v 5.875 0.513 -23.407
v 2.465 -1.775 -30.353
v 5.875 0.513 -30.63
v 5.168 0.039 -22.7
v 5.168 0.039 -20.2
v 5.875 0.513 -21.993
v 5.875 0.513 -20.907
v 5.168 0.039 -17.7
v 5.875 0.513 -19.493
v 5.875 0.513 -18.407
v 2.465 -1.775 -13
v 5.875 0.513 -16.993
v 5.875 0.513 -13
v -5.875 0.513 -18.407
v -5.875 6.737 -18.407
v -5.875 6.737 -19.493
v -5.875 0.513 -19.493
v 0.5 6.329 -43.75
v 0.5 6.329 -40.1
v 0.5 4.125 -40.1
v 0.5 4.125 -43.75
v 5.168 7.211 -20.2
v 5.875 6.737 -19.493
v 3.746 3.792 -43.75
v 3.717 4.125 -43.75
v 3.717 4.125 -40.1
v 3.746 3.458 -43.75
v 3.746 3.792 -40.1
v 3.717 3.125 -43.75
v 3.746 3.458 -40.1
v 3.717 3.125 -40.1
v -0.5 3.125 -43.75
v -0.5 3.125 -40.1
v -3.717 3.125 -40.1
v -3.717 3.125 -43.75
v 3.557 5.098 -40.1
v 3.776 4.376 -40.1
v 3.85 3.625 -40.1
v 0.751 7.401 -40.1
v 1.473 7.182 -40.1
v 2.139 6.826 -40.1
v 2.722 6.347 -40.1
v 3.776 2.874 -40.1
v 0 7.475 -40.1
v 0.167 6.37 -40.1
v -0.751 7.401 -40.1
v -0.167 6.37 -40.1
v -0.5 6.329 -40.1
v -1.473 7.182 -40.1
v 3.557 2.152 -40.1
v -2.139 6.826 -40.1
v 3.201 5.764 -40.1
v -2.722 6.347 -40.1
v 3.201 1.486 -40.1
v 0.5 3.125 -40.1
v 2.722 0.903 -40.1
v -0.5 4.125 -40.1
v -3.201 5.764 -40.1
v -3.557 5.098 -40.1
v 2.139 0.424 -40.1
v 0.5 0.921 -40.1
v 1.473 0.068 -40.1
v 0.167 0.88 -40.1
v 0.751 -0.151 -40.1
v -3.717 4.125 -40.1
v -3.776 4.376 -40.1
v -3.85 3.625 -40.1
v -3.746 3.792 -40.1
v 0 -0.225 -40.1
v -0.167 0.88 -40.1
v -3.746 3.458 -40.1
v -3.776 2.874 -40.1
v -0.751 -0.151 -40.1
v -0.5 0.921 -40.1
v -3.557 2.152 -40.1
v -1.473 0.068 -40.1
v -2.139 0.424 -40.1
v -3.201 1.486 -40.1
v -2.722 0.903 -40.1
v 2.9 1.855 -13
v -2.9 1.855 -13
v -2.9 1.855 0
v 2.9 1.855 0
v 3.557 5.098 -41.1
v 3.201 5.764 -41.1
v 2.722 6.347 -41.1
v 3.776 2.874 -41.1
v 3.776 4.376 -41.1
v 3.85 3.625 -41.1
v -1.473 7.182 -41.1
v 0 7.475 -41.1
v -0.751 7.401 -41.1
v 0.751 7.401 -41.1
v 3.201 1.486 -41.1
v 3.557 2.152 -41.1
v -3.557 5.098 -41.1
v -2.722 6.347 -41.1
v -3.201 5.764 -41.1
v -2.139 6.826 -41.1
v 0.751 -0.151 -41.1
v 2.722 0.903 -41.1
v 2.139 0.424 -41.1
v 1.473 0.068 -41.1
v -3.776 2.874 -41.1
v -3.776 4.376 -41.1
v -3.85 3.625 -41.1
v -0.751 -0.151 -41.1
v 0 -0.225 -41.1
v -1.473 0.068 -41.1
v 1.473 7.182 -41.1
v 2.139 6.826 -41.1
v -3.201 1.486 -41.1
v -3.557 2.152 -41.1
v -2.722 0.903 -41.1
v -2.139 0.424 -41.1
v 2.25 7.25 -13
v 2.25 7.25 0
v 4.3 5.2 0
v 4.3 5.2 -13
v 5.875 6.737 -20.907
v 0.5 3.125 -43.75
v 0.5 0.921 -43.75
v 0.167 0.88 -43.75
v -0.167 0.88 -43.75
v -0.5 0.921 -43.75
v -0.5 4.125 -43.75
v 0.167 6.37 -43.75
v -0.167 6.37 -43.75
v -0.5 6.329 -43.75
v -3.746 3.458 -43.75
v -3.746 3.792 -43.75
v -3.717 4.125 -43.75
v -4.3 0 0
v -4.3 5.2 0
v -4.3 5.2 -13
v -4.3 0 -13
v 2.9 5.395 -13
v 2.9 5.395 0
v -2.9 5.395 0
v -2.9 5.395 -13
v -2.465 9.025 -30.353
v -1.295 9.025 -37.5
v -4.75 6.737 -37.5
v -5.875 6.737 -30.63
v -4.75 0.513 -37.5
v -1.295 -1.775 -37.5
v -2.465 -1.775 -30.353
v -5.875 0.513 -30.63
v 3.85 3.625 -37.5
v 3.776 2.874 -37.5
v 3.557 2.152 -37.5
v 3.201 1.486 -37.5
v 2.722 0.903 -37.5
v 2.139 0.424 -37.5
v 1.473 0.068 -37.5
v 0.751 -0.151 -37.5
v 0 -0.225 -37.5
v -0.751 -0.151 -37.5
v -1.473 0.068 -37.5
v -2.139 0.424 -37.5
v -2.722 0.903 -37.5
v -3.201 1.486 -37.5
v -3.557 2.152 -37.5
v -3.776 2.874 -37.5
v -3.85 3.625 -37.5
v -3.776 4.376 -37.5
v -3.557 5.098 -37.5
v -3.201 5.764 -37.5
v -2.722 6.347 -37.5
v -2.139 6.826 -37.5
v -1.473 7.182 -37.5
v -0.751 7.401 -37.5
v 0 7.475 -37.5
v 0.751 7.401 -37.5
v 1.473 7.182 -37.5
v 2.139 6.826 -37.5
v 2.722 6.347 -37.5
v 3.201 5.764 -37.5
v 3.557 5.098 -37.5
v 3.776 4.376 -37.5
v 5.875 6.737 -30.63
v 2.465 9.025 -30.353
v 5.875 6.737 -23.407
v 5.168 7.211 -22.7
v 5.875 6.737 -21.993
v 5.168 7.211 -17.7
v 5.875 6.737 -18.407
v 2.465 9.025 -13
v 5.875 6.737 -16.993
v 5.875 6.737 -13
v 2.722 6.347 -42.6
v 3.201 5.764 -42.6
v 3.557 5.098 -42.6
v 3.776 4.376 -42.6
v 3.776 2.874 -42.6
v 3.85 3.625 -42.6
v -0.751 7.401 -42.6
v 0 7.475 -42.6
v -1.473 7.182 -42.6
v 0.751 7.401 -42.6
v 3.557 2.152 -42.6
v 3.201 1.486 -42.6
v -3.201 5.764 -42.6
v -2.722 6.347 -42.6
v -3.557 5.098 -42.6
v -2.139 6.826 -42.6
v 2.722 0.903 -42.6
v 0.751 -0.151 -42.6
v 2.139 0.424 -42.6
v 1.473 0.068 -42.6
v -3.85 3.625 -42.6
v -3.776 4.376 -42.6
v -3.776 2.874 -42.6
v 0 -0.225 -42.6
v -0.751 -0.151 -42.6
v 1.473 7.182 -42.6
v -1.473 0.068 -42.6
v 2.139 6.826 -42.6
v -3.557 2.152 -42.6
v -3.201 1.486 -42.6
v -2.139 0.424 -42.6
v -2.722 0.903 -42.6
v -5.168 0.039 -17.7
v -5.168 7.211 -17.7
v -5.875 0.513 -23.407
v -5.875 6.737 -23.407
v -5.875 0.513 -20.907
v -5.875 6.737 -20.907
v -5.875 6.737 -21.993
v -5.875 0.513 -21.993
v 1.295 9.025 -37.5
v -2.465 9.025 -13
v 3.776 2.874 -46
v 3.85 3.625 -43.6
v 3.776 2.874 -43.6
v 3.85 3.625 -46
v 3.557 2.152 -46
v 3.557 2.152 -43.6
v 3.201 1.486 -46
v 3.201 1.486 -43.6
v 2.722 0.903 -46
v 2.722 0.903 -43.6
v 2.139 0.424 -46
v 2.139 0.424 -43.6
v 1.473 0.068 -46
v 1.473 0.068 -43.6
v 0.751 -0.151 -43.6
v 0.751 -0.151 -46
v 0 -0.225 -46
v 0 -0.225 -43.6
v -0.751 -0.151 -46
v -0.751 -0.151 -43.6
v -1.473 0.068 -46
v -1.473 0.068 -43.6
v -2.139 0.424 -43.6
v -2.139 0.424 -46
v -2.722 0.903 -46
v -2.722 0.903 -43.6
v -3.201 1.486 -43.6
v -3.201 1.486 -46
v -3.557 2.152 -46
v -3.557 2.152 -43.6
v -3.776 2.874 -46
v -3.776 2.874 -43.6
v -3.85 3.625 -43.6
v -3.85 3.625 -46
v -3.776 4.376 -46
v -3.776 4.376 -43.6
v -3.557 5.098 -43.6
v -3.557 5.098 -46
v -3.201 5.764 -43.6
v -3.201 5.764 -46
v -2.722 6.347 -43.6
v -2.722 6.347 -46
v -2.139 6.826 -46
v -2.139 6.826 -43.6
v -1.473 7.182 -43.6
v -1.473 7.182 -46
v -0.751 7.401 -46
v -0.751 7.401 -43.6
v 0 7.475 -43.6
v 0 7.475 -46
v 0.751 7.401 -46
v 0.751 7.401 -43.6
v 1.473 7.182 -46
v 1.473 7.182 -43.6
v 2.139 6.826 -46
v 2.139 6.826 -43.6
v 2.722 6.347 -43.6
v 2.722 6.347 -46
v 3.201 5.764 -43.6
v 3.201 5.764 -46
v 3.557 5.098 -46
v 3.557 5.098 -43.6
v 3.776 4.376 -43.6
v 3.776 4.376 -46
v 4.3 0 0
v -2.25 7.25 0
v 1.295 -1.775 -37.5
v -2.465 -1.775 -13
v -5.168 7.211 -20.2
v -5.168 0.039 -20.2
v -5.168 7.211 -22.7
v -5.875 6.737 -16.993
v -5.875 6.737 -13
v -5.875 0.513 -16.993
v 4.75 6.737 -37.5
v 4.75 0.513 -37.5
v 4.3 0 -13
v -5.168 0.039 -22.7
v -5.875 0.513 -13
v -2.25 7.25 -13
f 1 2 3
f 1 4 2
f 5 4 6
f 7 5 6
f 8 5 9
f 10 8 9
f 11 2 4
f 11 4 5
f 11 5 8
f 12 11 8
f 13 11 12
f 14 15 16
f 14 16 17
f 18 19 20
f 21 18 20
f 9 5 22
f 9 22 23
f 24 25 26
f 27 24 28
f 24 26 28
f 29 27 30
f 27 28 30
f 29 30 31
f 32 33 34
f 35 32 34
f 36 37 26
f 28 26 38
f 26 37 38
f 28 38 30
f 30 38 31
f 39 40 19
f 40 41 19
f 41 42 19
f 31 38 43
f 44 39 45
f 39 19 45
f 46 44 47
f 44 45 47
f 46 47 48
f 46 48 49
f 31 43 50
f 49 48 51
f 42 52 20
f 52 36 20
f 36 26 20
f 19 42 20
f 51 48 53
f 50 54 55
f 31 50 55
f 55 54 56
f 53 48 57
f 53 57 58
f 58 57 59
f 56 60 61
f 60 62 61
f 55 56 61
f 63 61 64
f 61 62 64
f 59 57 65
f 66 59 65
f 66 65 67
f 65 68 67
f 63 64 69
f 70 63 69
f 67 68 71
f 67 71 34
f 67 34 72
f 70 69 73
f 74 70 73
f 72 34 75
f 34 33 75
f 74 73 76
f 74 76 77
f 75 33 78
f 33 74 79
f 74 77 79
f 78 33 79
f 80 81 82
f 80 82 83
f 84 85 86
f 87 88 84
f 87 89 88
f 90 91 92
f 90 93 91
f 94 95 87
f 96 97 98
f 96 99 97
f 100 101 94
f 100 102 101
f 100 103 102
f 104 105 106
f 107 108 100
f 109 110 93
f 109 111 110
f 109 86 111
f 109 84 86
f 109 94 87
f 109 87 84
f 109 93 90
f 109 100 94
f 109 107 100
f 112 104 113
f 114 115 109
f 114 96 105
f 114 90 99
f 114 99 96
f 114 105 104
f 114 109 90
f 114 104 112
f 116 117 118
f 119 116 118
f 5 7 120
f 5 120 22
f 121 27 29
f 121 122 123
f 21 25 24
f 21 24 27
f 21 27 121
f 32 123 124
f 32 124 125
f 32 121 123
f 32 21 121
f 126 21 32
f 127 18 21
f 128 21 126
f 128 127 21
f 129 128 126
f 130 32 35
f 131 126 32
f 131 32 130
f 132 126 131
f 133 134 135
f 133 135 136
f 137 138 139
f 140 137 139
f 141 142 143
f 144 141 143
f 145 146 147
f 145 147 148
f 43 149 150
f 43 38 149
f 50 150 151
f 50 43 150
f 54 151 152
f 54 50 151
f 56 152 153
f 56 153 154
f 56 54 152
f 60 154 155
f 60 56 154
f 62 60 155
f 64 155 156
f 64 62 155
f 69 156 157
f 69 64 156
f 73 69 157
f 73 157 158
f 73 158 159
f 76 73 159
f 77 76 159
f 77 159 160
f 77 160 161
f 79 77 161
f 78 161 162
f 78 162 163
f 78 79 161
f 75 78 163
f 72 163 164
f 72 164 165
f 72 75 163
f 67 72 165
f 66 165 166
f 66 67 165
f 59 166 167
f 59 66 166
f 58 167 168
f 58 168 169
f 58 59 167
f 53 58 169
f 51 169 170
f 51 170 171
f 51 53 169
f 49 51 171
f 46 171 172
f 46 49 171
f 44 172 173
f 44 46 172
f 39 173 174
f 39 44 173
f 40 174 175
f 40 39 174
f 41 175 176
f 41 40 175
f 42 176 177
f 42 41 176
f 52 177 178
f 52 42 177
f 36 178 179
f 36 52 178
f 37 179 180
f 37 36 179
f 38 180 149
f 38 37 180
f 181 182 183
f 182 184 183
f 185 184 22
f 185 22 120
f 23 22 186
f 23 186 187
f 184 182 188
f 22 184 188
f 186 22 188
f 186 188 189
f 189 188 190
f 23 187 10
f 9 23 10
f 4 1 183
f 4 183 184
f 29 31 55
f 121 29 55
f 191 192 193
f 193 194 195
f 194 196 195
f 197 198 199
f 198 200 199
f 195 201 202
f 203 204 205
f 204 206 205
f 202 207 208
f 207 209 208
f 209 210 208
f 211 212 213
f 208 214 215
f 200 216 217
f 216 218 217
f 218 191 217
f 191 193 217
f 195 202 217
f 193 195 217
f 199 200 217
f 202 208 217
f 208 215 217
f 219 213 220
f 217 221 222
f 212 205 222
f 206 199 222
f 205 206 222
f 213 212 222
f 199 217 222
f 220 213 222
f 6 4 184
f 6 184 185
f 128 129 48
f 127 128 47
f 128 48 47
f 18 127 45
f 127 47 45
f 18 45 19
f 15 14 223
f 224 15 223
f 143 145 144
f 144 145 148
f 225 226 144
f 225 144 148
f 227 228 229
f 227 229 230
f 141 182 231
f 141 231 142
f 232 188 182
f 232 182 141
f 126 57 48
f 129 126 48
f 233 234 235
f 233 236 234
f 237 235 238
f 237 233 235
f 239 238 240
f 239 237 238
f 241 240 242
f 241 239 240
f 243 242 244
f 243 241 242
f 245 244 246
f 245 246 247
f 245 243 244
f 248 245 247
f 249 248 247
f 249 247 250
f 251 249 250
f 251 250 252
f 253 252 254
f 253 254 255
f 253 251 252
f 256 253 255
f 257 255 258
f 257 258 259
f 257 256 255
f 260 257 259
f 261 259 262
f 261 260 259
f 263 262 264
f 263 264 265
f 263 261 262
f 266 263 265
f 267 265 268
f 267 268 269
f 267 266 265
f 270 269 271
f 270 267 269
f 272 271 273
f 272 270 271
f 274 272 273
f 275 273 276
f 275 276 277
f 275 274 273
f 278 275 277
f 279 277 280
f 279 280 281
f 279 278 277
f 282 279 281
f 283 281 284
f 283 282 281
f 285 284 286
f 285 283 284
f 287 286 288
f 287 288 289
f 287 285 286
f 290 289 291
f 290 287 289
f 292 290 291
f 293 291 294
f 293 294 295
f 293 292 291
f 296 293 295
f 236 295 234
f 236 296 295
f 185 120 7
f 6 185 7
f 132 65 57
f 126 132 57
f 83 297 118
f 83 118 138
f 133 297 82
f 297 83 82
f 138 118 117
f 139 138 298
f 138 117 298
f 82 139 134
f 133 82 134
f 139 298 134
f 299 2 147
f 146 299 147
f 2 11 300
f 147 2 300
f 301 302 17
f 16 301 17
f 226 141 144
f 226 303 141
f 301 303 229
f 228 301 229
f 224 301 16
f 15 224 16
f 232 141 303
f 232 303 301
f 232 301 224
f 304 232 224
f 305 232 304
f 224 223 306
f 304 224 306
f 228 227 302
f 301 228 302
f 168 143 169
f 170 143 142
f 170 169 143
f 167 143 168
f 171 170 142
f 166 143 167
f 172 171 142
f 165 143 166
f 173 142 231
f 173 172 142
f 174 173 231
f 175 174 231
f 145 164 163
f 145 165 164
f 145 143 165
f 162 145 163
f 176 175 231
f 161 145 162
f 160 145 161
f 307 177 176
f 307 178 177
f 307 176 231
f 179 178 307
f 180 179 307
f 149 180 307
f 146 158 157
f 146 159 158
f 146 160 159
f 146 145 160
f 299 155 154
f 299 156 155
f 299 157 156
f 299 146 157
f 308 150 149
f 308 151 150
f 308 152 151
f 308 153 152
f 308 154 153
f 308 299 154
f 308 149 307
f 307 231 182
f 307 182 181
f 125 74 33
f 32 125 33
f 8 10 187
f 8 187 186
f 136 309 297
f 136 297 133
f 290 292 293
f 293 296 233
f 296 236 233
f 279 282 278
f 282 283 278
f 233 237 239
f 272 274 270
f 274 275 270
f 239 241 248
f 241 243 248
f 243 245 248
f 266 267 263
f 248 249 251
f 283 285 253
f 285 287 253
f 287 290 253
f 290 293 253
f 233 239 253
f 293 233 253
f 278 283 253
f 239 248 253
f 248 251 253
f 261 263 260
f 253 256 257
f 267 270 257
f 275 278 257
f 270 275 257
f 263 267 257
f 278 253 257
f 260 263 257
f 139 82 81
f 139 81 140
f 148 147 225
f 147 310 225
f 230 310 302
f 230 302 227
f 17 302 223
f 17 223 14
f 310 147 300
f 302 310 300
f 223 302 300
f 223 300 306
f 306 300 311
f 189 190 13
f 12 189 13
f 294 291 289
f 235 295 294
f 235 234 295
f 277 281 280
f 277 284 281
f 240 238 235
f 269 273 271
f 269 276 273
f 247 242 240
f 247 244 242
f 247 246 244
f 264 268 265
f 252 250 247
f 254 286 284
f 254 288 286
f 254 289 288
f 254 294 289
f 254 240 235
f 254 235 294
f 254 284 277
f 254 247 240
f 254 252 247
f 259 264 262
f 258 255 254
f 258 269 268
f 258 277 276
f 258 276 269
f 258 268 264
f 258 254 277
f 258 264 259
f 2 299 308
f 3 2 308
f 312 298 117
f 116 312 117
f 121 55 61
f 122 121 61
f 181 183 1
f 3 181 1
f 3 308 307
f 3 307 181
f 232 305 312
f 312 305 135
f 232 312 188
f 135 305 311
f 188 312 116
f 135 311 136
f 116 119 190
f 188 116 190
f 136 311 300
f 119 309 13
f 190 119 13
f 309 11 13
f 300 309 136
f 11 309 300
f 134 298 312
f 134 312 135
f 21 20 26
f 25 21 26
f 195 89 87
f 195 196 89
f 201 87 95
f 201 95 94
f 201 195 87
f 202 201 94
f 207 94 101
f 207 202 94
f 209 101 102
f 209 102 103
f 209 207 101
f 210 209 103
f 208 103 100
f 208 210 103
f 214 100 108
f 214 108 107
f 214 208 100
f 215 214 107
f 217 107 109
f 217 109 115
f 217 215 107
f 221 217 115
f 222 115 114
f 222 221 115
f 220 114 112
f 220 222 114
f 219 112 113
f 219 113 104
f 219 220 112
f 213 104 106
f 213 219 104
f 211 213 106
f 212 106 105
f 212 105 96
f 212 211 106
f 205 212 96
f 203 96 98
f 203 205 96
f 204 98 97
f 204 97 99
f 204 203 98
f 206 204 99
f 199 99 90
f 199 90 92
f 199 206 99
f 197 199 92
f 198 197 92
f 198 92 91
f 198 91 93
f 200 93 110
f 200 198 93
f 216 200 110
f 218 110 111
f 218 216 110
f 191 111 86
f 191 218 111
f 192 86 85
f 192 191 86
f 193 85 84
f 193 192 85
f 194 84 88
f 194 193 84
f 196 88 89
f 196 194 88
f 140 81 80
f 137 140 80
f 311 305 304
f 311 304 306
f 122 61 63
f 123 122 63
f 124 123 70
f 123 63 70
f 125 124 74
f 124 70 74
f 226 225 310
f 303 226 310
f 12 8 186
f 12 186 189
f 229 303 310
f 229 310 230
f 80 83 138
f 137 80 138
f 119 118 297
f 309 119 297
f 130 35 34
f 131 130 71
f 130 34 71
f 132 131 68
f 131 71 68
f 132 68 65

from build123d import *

# Parameters (mm, degrees)
SKETCH1_W           = 1.3
SKETCH1_H           = 0.555
BOSS_EXTRUDE1_DEPTH = 13
SKETCH3_W           = 2.9
SKETCH3_H           = 1.77
BOSS_EXTRUDE2_DEPTH = 24.5
CUT_EXTRUDE1_DEPTH  = 40.015589833
CHAMFER1_SIZE       = 3.41
CHAMFER1_SIZE_2     = 2.287970931
SKETCH7_W           = 3.85
SKETCH7_H           = 2.6
SKETCH7_H_2         = 1.5
SKETCH7_H_3         = 2.4
BOSS_EXTRUDE3_DEPTH = 6.25


with BuildPart() as part:
    # Sketch1 → Boss-Extrude1 (new body)
    with BuildSketch(Plane.XY):
        Polygon((-1.3, 0.3), (-1.3, 1.3), (-1.3, 1.855), (-2.9, 1.855), (-2.9, 5.395), (-1.3, 5.395), (-1.3, 5.95), (-1.3, 6.95), (-2.125735931, 6.95), (-4, 5.075735931), (-4, 0.3), align=None)
        with Locations((-0.65, 1.5775)):
            Rectangle(SKETCH1_W, SKETCH1_H)
        Polygon((-4.3, 0), (0, 0), (0, 1.3), (-1.3, 1.3), (-1.3, 0.3), (-4, 0.3), (-4, 5.075735931), (-2.125735931, 6.95), (-1.3, 6.95), (-1.3, 5.95), (0, 5.95), (0, 7.25), (-2.25, 7.25), (-4.3, 5.2), align=None)
        with Locations((-0.65, 5.6725)):
            Rectangle(SKETCH1_W, SKETCH1_H)
    extrude(amount=-BOSS_EXTRUDE1_DEPTH)

    # Mirror1: part across plane


with BuildPart() as part_1:
    add(part.part)
    add(part.part.mirror(Plane(origin=(0, 0, -13), x_dir=(0, 0, 1), z_dir=(-1, 0, 0))))

    # Sketch3 → Boss-Extrude2 (add)
    with BuildSketch(Plane(origin=(0, 0, -13), x_dir=(-1, 0, 0), z_dir=(0, 0, -1))):
        with Locations((1.45, 4.51)):
            Rectangle(SKETCH3_W, SKETCH3_H)
        Polygon((2.25, 7.25), (0, 7.25), (0, 5.395), (2.9, 5.395), (2.9, 3.625), (4.3, 3.625), (4.3, 5.2), align=None)
        Polygon((3.043750454, 9.025), (0, 9.025), (0, 7.25), (2.25, 7.25), (4.3, 5.2), (4.3, 3.625), (5.875, 3.625), (5.875, 7.125), (5.875, 9.025), align=None)
    extrude(amount=BOSS_EXTRUDE2_DEPTH)

    # Sketch4 → Cut-Extrude1 (cut, through all)
    with BuildSketch(Plane(origin=(0, 9.025, 0), x_dir=(1, 0, 0), z_dir=(0, 1, 0))):
        Polygon((-4.75, 37.5), (-5.875, 30.63), (-5.875, 37.5), align=None)
        Polygon((-5.875, 23.407106781), (-5.167893219, 22.7), (-5.875, 21.992893219), align=None)
        Polygon((-5.167893219, 20.2), (-5.875, 19.492893219), (-5.875, 20.907106781), align=None)
        Polygon((-5.167893219, 17.7), (-5.875, 16.992893219), (-5.875, 18.407106781), align=None)
    extrude(amount=-CUT_EXTRUDE1_DEPTH, mode=Mode.SUBTRACT)

    # Chamfer1
    # the kernel refuses this chamfer: 3.41, 2.287970931 mm, written as the material it takes off along each edge
    with BuildSketch(Plane(origin=(-5.875, 9.025, -4.189784247), x_dir=(0.9997674455612761, 0.021565129164482656, 0), z_dir=(0, 0, -1))) as chamfer1_piece_1:
        Polygon((CHAMFER1_SIZE * 0.999767445561, CHAMFER1_SIZE * 0.0215651291645), (-CHAMFER1_SIZE_2 * 0.0215651291646, CHAMFER1_SIZE_2 * 0.999767445568), (0, 0), align=None)
    extrude(amount=21.613324726, mode=Mode.SUBTRACT)
    with BuildSketch(Plane(origin=(-5.875, 9.025, -14.596891028), x_dir=(0.9997674455612761, 0.021565129164482656, 0), z_dir=(0, 0, -1))) as chamfer1_piece_2:
        Polygon((CHAMFER1_SIZE * 0.999767445561, CHAMFER1_SIZE * 0.0215651291645), (-CHAMFER1_SIZE_2 * 0.0215651291646, CHAMFER1_SIZE_2 * 0.999767445568), (0, 0), align=None)
    extrude(amount=24.843324726, mode=Mode.SUBTRACT)
    with BuildSketch(Plane(origin=(-3.326242426, 9.025, -46.194412918), x_dir=(0.986626348001283, 0.021565129164482656, 0.1615654500002101), z_dir=(-0.16160303150249725, 0, 0.9868558457085832))) as chamfer1_piece_3:
        Polygon((CHAMFER1_SIZE * 0.999767445561, -CHAMFER1_SIZE * 0.0215651291645), (-CHAMFER1_SIZE_2 * 0.0215651291646, -CHAMFER1_SIZE_2 * 0.999767445568), (0, 0), align=None)
    extrude(amount=24.581934577, mode=Mode.SUBTRACT)


with BuildPart() as body_2:
    # Split1: the piece on the far side of the plane
    add(part_1.part)
    split(bisect_by=Plane.XY.offset(-13), keep=Keep.BOTTOM)

    # Mirror9: body 2 across plane


with BuildPart() as part_2:
    add(part_1.part)

    # Split1
    split(bisect_by=Plane.XY.offset(-13), keep=Keep.TOP)


with BuildPart() as body_2_1:
    add(body_2.part)
    add(body_2.part.mirror(Plane(origin=(0, 0, -37.5), x_dir=(0, 0, 1), z_dir=(-1, 0, 0))))

    # Mirror10: body 2 across plane


with BuildPart() as body_2_2:
    add(body_2_1.part)
    add(body_2_1.part.mirror(Plane(origin=(0, 3.625, -37.5), x_dir=(0, 0, 1), z_dir=(0, 1, 0))))

    # Combine1: union part
    add(part_2.part)

    # Sketch7 → Revolve1 (revolve)
    with BuildSketch(Plane(origin=(0, 3.625, 0), x_dir=(1, 0, 0), z_dir=(0, 1, 0))):
        with Locations((1.925, 38.8)):
            Rectangle(SKETCH7_W, SKETCH7_H)
        with Locations((1.925, 41.85)):
            Rectangle(SKETCH7_W, SKETCH7_H_2)
        with Locations((1.925, 44.8)):
            Rectangle(SKETCH7_W, SKETCH7_H_3)
    revolve(axis=Axis((0, 3.625, -43.6), (0, 0, -1)))


with BuildPart() as revolve1_piece_1:
    # of the separate pieces the step leaves, piece 1, a body of its own (revolve1_pieces)
    add(body_2_2.part.solids().sort_by_distance((-5.875, 6.737029069, -13))[0])

    # Sketch5 → Boss-Extrude3 (add)
    with BuildSketch(Plane(origin=(0, 0, -37.5), x_dir=(-1, 0, 0), z_dir=(0, 0, -1))):
        with BuildLine():
            Line((-0.5, 6.329163457), (-0.5, 4.125))
            Line((-0.5, 4.125), (-3.716517187, 4.125))
            ThreePointArc((-3.716517187, 4.125), (-3.75, 3.625), (-3.716517187, 3.125))
            Line((-3.716517187, 3.125), (-0.5, 3.125))
            Line((-0.5, 3.125), (-0.5, 0.920836543))
            ThreePointArc((-0.5, 0.920836543), (0, 0.875), (0.5, 0.920836543))
            Line((0.5, 0.920836543), (0.5, 3.125))
            Line((0.5, 3.125), (3.716517187, 3.125))
            ThreePointArc((3.716517187, 3.125), (3.75, 3.625), (3.716517187, 4.125))
            Line((3.716517187, 4.125), (0.5, 4.125))
            Line((0.5, 4.125), (0.5, 6.329163457))
            ThreePointArc((0.5, 6.329163457), (0, 6.375), (-0.5, 6.329163457))
        make_face()
    extrude(amount=BOSS_EXTRUDE3_DEPTH)


with BuildPart() as revolve1_piece_2:
    # of the separate pieces the step leaves, piece 2, a body of its own (revolve1_pieces)
    add(body_2_2.part.solids().sort_by_distance((3.85, 3.625, -43.6))[0])


with BuildPart() as revolve1_piece_3:
    # of the separate pieces the step leaves, piece 3, a body of its own (revolve1_pieces)
    add(body_2_2.part.solids().sort_by_distance((3.85, 3.625, -41.1))[0])


solid = Compound([revolve1_piece_1.part, revolve1_piece_2.part, revolve1_piece_3.part])
